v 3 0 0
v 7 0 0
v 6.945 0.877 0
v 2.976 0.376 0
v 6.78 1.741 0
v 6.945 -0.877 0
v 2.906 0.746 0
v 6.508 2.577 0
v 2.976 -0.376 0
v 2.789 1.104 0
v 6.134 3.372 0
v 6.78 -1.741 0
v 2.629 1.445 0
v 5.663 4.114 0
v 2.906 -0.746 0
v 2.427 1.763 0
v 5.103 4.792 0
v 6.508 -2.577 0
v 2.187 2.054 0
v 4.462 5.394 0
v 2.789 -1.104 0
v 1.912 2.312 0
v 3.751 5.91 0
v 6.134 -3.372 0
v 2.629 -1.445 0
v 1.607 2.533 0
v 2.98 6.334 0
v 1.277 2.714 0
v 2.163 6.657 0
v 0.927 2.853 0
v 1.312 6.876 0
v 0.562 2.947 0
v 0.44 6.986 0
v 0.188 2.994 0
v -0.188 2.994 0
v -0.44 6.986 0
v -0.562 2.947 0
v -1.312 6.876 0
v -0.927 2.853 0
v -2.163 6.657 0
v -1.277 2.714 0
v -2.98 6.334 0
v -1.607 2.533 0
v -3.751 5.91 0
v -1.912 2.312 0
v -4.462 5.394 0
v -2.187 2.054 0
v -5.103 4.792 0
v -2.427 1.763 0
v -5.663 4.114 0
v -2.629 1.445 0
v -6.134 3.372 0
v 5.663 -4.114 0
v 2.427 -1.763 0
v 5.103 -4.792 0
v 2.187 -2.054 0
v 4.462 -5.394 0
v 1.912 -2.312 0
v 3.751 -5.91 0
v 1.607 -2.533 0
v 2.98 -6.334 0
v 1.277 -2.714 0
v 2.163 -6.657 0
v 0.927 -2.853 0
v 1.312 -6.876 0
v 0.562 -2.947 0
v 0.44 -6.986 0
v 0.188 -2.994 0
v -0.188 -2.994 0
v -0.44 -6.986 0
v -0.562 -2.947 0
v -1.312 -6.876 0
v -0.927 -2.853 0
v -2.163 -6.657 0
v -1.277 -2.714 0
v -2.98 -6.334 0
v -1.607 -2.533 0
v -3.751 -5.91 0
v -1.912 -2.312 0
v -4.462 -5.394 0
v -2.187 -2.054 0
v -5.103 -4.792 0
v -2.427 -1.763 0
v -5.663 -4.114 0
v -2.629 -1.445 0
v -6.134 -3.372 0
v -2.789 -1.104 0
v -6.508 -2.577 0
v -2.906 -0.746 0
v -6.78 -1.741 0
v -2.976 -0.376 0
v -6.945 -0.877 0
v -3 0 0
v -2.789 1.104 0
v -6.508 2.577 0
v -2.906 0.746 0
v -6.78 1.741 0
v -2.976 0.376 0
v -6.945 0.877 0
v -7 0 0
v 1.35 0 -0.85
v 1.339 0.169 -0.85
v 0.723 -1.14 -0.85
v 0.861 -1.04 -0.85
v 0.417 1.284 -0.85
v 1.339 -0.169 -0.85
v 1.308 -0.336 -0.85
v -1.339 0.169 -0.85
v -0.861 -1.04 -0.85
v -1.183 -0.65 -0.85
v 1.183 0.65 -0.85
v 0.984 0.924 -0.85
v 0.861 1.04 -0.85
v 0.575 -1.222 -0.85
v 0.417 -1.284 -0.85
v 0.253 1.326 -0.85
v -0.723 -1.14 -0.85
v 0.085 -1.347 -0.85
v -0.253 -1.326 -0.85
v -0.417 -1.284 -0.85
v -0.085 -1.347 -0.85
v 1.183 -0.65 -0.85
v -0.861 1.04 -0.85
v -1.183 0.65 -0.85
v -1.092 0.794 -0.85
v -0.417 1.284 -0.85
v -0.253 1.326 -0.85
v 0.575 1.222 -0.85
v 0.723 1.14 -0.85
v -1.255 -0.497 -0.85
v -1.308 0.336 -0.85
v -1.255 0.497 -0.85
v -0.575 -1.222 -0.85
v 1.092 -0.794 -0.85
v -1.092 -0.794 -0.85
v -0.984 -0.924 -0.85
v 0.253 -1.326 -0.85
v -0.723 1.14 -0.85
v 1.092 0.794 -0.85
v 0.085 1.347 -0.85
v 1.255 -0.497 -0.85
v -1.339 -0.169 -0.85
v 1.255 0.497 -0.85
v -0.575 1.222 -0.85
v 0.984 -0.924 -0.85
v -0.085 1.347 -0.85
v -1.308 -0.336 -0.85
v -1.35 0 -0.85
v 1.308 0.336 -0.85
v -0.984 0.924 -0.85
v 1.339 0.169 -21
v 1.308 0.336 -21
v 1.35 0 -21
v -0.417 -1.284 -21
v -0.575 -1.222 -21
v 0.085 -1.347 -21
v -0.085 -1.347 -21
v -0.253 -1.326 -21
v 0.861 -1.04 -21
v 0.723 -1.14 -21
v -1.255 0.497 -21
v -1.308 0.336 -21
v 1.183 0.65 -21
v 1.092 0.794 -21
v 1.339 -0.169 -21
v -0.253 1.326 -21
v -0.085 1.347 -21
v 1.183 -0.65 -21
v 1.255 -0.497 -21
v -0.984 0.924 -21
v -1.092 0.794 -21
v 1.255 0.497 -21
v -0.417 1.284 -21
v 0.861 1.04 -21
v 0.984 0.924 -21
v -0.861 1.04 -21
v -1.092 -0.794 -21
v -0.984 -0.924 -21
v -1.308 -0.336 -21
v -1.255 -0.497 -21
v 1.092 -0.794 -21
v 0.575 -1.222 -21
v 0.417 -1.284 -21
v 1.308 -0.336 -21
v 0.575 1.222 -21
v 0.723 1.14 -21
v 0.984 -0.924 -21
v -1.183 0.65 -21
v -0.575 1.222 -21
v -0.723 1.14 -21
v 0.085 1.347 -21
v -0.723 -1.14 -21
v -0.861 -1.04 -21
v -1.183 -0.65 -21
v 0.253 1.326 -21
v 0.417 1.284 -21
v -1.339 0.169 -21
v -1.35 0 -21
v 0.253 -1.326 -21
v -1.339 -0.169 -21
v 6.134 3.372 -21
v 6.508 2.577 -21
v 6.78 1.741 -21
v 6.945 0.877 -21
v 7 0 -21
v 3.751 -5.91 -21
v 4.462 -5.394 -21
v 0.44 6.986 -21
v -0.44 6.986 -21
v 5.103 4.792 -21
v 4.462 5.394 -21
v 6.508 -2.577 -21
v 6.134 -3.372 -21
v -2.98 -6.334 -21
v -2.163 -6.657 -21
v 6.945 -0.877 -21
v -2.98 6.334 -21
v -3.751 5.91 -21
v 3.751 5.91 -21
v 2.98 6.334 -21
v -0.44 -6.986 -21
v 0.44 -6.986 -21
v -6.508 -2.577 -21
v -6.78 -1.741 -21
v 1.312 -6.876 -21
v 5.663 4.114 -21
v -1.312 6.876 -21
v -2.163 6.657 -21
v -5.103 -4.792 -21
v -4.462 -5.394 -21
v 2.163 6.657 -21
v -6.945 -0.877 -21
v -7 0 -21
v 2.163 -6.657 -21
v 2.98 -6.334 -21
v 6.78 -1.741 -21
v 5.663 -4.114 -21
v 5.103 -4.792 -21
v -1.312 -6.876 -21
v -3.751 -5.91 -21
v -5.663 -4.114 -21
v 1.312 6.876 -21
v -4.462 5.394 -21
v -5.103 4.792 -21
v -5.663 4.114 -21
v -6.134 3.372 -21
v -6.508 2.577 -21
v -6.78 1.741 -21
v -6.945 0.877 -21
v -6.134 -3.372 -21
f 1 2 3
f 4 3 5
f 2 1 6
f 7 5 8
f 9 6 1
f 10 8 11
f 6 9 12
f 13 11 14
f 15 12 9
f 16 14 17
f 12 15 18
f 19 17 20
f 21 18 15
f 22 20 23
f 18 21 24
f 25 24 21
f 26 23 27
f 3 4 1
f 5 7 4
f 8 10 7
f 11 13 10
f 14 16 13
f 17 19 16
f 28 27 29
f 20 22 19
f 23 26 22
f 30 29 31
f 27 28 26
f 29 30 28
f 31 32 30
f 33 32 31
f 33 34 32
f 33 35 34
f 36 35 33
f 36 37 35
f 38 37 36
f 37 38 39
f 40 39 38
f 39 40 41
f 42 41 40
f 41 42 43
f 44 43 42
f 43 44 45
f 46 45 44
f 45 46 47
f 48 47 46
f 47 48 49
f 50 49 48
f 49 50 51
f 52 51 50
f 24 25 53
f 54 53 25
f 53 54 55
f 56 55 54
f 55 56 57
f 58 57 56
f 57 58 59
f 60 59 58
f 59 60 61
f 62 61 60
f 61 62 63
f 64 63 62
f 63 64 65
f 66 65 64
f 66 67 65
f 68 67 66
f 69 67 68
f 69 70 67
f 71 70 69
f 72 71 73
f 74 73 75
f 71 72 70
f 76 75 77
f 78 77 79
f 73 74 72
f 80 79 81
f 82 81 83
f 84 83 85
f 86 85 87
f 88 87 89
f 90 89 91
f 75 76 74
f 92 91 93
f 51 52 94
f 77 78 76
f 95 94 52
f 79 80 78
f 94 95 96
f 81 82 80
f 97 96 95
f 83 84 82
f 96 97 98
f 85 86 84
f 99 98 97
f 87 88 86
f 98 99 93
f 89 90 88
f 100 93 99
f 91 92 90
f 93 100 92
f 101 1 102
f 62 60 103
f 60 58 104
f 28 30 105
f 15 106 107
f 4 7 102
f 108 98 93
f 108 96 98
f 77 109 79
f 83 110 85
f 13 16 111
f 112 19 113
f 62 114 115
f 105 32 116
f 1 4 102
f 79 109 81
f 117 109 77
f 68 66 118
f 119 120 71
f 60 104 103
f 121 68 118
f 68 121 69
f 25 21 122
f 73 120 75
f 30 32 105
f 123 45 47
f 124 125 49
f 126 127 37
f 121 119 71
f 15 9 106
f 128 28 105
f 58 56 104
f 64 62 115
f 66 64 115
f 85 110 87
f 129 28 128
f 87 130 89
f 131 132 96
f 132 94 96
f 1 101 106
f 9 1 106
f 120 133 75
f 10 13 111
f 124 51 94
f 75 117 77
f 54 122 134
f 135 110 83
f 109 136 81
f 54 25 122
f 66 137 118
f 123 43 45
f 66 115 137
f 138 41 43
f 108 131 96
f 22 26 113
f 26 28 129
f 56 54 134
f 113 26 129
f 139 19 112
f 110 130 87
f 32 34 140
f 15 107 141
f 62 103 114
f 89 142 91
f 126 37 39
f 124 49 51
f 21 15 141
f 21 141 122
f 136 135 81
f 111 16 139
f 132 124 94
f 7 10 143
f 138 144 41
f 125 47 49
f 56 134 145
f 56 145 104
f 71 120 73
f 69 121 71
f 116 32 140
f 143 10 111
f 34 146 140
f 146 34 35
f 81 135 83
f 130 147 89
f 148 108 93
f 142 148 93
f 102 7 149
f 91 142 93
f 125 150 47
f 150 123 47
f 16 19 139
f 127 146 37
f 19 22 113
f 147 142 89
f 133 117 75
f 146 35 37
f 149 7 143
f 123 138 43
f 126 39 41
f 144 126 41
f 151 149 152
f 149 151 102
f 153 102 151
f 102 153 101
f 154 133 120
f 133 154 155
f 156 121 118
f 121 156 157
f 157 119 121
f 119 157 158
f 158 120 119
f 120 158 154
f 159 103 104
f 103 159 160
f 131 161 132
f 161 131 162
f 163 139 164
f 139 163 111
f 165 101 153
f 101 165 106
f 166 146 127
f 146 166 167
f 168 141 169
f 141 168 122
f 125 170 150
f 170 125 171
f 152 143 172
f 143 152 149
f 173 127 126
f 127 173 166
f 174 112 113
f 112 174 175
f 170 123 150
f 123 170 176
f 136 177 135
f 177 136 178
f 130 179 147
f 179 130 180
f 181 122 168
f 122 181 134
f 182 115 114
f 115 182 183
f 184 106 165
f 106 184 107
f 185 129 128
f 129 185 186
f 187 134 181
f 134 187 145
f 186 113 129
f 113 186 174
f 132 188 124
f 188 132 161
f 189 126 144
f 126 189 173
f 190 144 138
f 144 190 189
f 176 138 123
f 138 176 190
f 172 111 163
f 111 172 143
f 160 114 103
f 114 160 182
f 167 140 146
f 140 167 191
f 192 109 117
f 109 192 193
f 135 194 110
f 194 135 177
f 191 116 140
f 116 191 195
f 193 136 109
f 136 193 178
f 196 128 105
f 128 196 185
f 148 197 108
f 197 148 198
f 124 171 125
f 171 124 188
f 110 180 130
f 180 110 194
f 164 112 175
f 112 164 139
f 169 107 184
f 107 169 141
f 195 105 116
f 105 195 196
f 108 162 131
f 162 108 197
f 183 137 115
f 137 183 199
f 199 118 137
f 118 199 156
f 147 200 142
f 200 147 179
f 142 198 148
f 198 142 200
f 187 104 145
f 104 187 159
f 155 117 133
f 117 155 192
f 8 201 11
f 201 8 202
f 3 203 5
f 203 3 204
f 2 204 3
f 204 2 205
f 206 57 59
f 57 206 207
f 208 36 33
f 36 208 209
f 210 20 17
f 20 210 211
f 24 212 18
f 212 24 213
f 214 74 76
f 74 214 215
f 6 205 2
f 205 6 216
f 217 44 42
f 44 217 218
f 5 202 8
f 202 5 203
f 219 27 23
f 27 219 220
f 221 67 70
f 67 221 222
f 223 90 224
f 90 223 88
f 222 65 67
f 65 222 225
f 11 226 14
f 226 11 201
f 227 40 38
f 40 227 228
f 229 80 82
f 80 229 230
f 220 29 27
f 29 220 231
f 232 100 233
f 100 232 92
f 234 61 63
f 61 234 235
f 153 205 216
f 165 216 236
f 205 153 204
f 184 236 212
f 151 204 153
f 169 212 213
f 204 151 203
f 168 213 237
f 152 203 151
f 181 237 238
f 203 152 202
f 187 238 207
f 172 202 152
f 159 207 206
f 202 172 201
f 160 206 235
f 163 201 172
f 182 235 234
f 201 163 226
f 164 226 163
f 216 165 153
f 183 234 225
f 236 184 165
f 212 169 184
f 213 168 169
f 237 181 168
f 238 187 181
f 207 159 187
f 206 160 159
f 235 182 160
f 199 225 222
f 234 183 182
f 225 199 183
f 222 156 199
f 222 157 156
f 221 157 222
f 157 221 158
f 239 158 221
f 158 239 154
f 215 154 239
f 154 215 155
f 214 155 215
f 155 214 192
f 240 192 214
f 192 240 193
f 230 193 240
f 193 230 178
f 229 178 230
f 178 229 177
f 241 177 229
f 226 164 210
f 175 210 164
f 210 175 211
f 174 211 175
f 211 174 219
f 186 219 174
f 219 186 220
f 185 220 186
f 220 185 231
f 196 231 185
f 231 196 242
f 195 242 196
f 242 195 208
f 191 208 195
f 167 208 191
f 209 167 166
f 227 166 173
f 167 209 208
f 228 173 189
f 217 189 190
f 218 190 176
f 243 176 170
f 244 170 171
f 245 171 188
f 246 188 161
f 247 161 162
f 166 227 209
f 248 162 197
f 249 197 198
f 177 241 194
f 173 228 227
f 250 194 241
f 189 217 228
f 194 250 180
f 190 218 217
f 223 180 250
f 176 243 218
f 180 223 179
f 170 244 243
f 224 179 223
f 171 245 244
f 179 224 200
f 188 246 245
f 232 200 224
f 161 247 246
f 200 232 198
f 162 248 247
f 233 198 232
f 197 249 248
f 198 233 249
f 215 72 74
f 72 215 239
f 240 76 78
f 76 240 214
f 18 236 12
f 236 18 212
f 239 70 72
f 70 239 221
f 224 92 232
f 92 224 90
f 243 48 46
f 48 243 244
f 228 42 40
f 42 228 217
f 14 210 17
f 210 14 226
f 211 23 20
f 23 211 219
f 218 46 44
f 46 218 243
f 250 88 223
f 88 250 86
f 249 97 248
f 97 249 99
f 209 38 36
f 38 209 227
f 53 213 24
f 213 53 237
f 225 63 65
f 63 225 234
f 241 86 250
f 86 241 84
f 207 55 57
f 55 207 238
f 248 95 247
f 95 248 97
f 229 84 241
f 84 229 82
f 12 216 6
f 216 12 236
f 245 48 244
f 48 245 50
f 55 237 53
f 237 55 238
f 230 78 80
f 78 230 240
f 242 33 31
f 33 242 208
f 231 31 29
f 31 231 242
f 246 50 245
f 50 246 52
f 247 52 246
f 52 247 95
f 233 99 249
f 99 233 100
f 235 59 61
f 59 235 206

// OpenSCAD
$fn = 50;

difference() {
	union() {
		translate(v = [0, 0, -21.0]) {
			cylinder(h = 21, r = 7.0);
		}
	}
	union() {
		translate(v = [0, 0, 0]) {
			rotate(a = [0, 0, 0]) {
				difference() {
					union() {
						translate(v = [0, 0, -24.0]) {
							cylinder(h = 24, r = 1.0);
						}
						translate(v = [0, 0, -0.85]) {
							cylinder(h = 0.85, r1 = 1.35, r2 = 3.0);
						}
						translate(v = [0, 0, -24.0]) {
							cylinder(h = 24, r = 1.35);
						}
						translate(v = [0, 0, -24.0]) {
							cylinder(h = 24, r = 1.0);
						}
					}
					union();
				}
			}
		}
	}
}
